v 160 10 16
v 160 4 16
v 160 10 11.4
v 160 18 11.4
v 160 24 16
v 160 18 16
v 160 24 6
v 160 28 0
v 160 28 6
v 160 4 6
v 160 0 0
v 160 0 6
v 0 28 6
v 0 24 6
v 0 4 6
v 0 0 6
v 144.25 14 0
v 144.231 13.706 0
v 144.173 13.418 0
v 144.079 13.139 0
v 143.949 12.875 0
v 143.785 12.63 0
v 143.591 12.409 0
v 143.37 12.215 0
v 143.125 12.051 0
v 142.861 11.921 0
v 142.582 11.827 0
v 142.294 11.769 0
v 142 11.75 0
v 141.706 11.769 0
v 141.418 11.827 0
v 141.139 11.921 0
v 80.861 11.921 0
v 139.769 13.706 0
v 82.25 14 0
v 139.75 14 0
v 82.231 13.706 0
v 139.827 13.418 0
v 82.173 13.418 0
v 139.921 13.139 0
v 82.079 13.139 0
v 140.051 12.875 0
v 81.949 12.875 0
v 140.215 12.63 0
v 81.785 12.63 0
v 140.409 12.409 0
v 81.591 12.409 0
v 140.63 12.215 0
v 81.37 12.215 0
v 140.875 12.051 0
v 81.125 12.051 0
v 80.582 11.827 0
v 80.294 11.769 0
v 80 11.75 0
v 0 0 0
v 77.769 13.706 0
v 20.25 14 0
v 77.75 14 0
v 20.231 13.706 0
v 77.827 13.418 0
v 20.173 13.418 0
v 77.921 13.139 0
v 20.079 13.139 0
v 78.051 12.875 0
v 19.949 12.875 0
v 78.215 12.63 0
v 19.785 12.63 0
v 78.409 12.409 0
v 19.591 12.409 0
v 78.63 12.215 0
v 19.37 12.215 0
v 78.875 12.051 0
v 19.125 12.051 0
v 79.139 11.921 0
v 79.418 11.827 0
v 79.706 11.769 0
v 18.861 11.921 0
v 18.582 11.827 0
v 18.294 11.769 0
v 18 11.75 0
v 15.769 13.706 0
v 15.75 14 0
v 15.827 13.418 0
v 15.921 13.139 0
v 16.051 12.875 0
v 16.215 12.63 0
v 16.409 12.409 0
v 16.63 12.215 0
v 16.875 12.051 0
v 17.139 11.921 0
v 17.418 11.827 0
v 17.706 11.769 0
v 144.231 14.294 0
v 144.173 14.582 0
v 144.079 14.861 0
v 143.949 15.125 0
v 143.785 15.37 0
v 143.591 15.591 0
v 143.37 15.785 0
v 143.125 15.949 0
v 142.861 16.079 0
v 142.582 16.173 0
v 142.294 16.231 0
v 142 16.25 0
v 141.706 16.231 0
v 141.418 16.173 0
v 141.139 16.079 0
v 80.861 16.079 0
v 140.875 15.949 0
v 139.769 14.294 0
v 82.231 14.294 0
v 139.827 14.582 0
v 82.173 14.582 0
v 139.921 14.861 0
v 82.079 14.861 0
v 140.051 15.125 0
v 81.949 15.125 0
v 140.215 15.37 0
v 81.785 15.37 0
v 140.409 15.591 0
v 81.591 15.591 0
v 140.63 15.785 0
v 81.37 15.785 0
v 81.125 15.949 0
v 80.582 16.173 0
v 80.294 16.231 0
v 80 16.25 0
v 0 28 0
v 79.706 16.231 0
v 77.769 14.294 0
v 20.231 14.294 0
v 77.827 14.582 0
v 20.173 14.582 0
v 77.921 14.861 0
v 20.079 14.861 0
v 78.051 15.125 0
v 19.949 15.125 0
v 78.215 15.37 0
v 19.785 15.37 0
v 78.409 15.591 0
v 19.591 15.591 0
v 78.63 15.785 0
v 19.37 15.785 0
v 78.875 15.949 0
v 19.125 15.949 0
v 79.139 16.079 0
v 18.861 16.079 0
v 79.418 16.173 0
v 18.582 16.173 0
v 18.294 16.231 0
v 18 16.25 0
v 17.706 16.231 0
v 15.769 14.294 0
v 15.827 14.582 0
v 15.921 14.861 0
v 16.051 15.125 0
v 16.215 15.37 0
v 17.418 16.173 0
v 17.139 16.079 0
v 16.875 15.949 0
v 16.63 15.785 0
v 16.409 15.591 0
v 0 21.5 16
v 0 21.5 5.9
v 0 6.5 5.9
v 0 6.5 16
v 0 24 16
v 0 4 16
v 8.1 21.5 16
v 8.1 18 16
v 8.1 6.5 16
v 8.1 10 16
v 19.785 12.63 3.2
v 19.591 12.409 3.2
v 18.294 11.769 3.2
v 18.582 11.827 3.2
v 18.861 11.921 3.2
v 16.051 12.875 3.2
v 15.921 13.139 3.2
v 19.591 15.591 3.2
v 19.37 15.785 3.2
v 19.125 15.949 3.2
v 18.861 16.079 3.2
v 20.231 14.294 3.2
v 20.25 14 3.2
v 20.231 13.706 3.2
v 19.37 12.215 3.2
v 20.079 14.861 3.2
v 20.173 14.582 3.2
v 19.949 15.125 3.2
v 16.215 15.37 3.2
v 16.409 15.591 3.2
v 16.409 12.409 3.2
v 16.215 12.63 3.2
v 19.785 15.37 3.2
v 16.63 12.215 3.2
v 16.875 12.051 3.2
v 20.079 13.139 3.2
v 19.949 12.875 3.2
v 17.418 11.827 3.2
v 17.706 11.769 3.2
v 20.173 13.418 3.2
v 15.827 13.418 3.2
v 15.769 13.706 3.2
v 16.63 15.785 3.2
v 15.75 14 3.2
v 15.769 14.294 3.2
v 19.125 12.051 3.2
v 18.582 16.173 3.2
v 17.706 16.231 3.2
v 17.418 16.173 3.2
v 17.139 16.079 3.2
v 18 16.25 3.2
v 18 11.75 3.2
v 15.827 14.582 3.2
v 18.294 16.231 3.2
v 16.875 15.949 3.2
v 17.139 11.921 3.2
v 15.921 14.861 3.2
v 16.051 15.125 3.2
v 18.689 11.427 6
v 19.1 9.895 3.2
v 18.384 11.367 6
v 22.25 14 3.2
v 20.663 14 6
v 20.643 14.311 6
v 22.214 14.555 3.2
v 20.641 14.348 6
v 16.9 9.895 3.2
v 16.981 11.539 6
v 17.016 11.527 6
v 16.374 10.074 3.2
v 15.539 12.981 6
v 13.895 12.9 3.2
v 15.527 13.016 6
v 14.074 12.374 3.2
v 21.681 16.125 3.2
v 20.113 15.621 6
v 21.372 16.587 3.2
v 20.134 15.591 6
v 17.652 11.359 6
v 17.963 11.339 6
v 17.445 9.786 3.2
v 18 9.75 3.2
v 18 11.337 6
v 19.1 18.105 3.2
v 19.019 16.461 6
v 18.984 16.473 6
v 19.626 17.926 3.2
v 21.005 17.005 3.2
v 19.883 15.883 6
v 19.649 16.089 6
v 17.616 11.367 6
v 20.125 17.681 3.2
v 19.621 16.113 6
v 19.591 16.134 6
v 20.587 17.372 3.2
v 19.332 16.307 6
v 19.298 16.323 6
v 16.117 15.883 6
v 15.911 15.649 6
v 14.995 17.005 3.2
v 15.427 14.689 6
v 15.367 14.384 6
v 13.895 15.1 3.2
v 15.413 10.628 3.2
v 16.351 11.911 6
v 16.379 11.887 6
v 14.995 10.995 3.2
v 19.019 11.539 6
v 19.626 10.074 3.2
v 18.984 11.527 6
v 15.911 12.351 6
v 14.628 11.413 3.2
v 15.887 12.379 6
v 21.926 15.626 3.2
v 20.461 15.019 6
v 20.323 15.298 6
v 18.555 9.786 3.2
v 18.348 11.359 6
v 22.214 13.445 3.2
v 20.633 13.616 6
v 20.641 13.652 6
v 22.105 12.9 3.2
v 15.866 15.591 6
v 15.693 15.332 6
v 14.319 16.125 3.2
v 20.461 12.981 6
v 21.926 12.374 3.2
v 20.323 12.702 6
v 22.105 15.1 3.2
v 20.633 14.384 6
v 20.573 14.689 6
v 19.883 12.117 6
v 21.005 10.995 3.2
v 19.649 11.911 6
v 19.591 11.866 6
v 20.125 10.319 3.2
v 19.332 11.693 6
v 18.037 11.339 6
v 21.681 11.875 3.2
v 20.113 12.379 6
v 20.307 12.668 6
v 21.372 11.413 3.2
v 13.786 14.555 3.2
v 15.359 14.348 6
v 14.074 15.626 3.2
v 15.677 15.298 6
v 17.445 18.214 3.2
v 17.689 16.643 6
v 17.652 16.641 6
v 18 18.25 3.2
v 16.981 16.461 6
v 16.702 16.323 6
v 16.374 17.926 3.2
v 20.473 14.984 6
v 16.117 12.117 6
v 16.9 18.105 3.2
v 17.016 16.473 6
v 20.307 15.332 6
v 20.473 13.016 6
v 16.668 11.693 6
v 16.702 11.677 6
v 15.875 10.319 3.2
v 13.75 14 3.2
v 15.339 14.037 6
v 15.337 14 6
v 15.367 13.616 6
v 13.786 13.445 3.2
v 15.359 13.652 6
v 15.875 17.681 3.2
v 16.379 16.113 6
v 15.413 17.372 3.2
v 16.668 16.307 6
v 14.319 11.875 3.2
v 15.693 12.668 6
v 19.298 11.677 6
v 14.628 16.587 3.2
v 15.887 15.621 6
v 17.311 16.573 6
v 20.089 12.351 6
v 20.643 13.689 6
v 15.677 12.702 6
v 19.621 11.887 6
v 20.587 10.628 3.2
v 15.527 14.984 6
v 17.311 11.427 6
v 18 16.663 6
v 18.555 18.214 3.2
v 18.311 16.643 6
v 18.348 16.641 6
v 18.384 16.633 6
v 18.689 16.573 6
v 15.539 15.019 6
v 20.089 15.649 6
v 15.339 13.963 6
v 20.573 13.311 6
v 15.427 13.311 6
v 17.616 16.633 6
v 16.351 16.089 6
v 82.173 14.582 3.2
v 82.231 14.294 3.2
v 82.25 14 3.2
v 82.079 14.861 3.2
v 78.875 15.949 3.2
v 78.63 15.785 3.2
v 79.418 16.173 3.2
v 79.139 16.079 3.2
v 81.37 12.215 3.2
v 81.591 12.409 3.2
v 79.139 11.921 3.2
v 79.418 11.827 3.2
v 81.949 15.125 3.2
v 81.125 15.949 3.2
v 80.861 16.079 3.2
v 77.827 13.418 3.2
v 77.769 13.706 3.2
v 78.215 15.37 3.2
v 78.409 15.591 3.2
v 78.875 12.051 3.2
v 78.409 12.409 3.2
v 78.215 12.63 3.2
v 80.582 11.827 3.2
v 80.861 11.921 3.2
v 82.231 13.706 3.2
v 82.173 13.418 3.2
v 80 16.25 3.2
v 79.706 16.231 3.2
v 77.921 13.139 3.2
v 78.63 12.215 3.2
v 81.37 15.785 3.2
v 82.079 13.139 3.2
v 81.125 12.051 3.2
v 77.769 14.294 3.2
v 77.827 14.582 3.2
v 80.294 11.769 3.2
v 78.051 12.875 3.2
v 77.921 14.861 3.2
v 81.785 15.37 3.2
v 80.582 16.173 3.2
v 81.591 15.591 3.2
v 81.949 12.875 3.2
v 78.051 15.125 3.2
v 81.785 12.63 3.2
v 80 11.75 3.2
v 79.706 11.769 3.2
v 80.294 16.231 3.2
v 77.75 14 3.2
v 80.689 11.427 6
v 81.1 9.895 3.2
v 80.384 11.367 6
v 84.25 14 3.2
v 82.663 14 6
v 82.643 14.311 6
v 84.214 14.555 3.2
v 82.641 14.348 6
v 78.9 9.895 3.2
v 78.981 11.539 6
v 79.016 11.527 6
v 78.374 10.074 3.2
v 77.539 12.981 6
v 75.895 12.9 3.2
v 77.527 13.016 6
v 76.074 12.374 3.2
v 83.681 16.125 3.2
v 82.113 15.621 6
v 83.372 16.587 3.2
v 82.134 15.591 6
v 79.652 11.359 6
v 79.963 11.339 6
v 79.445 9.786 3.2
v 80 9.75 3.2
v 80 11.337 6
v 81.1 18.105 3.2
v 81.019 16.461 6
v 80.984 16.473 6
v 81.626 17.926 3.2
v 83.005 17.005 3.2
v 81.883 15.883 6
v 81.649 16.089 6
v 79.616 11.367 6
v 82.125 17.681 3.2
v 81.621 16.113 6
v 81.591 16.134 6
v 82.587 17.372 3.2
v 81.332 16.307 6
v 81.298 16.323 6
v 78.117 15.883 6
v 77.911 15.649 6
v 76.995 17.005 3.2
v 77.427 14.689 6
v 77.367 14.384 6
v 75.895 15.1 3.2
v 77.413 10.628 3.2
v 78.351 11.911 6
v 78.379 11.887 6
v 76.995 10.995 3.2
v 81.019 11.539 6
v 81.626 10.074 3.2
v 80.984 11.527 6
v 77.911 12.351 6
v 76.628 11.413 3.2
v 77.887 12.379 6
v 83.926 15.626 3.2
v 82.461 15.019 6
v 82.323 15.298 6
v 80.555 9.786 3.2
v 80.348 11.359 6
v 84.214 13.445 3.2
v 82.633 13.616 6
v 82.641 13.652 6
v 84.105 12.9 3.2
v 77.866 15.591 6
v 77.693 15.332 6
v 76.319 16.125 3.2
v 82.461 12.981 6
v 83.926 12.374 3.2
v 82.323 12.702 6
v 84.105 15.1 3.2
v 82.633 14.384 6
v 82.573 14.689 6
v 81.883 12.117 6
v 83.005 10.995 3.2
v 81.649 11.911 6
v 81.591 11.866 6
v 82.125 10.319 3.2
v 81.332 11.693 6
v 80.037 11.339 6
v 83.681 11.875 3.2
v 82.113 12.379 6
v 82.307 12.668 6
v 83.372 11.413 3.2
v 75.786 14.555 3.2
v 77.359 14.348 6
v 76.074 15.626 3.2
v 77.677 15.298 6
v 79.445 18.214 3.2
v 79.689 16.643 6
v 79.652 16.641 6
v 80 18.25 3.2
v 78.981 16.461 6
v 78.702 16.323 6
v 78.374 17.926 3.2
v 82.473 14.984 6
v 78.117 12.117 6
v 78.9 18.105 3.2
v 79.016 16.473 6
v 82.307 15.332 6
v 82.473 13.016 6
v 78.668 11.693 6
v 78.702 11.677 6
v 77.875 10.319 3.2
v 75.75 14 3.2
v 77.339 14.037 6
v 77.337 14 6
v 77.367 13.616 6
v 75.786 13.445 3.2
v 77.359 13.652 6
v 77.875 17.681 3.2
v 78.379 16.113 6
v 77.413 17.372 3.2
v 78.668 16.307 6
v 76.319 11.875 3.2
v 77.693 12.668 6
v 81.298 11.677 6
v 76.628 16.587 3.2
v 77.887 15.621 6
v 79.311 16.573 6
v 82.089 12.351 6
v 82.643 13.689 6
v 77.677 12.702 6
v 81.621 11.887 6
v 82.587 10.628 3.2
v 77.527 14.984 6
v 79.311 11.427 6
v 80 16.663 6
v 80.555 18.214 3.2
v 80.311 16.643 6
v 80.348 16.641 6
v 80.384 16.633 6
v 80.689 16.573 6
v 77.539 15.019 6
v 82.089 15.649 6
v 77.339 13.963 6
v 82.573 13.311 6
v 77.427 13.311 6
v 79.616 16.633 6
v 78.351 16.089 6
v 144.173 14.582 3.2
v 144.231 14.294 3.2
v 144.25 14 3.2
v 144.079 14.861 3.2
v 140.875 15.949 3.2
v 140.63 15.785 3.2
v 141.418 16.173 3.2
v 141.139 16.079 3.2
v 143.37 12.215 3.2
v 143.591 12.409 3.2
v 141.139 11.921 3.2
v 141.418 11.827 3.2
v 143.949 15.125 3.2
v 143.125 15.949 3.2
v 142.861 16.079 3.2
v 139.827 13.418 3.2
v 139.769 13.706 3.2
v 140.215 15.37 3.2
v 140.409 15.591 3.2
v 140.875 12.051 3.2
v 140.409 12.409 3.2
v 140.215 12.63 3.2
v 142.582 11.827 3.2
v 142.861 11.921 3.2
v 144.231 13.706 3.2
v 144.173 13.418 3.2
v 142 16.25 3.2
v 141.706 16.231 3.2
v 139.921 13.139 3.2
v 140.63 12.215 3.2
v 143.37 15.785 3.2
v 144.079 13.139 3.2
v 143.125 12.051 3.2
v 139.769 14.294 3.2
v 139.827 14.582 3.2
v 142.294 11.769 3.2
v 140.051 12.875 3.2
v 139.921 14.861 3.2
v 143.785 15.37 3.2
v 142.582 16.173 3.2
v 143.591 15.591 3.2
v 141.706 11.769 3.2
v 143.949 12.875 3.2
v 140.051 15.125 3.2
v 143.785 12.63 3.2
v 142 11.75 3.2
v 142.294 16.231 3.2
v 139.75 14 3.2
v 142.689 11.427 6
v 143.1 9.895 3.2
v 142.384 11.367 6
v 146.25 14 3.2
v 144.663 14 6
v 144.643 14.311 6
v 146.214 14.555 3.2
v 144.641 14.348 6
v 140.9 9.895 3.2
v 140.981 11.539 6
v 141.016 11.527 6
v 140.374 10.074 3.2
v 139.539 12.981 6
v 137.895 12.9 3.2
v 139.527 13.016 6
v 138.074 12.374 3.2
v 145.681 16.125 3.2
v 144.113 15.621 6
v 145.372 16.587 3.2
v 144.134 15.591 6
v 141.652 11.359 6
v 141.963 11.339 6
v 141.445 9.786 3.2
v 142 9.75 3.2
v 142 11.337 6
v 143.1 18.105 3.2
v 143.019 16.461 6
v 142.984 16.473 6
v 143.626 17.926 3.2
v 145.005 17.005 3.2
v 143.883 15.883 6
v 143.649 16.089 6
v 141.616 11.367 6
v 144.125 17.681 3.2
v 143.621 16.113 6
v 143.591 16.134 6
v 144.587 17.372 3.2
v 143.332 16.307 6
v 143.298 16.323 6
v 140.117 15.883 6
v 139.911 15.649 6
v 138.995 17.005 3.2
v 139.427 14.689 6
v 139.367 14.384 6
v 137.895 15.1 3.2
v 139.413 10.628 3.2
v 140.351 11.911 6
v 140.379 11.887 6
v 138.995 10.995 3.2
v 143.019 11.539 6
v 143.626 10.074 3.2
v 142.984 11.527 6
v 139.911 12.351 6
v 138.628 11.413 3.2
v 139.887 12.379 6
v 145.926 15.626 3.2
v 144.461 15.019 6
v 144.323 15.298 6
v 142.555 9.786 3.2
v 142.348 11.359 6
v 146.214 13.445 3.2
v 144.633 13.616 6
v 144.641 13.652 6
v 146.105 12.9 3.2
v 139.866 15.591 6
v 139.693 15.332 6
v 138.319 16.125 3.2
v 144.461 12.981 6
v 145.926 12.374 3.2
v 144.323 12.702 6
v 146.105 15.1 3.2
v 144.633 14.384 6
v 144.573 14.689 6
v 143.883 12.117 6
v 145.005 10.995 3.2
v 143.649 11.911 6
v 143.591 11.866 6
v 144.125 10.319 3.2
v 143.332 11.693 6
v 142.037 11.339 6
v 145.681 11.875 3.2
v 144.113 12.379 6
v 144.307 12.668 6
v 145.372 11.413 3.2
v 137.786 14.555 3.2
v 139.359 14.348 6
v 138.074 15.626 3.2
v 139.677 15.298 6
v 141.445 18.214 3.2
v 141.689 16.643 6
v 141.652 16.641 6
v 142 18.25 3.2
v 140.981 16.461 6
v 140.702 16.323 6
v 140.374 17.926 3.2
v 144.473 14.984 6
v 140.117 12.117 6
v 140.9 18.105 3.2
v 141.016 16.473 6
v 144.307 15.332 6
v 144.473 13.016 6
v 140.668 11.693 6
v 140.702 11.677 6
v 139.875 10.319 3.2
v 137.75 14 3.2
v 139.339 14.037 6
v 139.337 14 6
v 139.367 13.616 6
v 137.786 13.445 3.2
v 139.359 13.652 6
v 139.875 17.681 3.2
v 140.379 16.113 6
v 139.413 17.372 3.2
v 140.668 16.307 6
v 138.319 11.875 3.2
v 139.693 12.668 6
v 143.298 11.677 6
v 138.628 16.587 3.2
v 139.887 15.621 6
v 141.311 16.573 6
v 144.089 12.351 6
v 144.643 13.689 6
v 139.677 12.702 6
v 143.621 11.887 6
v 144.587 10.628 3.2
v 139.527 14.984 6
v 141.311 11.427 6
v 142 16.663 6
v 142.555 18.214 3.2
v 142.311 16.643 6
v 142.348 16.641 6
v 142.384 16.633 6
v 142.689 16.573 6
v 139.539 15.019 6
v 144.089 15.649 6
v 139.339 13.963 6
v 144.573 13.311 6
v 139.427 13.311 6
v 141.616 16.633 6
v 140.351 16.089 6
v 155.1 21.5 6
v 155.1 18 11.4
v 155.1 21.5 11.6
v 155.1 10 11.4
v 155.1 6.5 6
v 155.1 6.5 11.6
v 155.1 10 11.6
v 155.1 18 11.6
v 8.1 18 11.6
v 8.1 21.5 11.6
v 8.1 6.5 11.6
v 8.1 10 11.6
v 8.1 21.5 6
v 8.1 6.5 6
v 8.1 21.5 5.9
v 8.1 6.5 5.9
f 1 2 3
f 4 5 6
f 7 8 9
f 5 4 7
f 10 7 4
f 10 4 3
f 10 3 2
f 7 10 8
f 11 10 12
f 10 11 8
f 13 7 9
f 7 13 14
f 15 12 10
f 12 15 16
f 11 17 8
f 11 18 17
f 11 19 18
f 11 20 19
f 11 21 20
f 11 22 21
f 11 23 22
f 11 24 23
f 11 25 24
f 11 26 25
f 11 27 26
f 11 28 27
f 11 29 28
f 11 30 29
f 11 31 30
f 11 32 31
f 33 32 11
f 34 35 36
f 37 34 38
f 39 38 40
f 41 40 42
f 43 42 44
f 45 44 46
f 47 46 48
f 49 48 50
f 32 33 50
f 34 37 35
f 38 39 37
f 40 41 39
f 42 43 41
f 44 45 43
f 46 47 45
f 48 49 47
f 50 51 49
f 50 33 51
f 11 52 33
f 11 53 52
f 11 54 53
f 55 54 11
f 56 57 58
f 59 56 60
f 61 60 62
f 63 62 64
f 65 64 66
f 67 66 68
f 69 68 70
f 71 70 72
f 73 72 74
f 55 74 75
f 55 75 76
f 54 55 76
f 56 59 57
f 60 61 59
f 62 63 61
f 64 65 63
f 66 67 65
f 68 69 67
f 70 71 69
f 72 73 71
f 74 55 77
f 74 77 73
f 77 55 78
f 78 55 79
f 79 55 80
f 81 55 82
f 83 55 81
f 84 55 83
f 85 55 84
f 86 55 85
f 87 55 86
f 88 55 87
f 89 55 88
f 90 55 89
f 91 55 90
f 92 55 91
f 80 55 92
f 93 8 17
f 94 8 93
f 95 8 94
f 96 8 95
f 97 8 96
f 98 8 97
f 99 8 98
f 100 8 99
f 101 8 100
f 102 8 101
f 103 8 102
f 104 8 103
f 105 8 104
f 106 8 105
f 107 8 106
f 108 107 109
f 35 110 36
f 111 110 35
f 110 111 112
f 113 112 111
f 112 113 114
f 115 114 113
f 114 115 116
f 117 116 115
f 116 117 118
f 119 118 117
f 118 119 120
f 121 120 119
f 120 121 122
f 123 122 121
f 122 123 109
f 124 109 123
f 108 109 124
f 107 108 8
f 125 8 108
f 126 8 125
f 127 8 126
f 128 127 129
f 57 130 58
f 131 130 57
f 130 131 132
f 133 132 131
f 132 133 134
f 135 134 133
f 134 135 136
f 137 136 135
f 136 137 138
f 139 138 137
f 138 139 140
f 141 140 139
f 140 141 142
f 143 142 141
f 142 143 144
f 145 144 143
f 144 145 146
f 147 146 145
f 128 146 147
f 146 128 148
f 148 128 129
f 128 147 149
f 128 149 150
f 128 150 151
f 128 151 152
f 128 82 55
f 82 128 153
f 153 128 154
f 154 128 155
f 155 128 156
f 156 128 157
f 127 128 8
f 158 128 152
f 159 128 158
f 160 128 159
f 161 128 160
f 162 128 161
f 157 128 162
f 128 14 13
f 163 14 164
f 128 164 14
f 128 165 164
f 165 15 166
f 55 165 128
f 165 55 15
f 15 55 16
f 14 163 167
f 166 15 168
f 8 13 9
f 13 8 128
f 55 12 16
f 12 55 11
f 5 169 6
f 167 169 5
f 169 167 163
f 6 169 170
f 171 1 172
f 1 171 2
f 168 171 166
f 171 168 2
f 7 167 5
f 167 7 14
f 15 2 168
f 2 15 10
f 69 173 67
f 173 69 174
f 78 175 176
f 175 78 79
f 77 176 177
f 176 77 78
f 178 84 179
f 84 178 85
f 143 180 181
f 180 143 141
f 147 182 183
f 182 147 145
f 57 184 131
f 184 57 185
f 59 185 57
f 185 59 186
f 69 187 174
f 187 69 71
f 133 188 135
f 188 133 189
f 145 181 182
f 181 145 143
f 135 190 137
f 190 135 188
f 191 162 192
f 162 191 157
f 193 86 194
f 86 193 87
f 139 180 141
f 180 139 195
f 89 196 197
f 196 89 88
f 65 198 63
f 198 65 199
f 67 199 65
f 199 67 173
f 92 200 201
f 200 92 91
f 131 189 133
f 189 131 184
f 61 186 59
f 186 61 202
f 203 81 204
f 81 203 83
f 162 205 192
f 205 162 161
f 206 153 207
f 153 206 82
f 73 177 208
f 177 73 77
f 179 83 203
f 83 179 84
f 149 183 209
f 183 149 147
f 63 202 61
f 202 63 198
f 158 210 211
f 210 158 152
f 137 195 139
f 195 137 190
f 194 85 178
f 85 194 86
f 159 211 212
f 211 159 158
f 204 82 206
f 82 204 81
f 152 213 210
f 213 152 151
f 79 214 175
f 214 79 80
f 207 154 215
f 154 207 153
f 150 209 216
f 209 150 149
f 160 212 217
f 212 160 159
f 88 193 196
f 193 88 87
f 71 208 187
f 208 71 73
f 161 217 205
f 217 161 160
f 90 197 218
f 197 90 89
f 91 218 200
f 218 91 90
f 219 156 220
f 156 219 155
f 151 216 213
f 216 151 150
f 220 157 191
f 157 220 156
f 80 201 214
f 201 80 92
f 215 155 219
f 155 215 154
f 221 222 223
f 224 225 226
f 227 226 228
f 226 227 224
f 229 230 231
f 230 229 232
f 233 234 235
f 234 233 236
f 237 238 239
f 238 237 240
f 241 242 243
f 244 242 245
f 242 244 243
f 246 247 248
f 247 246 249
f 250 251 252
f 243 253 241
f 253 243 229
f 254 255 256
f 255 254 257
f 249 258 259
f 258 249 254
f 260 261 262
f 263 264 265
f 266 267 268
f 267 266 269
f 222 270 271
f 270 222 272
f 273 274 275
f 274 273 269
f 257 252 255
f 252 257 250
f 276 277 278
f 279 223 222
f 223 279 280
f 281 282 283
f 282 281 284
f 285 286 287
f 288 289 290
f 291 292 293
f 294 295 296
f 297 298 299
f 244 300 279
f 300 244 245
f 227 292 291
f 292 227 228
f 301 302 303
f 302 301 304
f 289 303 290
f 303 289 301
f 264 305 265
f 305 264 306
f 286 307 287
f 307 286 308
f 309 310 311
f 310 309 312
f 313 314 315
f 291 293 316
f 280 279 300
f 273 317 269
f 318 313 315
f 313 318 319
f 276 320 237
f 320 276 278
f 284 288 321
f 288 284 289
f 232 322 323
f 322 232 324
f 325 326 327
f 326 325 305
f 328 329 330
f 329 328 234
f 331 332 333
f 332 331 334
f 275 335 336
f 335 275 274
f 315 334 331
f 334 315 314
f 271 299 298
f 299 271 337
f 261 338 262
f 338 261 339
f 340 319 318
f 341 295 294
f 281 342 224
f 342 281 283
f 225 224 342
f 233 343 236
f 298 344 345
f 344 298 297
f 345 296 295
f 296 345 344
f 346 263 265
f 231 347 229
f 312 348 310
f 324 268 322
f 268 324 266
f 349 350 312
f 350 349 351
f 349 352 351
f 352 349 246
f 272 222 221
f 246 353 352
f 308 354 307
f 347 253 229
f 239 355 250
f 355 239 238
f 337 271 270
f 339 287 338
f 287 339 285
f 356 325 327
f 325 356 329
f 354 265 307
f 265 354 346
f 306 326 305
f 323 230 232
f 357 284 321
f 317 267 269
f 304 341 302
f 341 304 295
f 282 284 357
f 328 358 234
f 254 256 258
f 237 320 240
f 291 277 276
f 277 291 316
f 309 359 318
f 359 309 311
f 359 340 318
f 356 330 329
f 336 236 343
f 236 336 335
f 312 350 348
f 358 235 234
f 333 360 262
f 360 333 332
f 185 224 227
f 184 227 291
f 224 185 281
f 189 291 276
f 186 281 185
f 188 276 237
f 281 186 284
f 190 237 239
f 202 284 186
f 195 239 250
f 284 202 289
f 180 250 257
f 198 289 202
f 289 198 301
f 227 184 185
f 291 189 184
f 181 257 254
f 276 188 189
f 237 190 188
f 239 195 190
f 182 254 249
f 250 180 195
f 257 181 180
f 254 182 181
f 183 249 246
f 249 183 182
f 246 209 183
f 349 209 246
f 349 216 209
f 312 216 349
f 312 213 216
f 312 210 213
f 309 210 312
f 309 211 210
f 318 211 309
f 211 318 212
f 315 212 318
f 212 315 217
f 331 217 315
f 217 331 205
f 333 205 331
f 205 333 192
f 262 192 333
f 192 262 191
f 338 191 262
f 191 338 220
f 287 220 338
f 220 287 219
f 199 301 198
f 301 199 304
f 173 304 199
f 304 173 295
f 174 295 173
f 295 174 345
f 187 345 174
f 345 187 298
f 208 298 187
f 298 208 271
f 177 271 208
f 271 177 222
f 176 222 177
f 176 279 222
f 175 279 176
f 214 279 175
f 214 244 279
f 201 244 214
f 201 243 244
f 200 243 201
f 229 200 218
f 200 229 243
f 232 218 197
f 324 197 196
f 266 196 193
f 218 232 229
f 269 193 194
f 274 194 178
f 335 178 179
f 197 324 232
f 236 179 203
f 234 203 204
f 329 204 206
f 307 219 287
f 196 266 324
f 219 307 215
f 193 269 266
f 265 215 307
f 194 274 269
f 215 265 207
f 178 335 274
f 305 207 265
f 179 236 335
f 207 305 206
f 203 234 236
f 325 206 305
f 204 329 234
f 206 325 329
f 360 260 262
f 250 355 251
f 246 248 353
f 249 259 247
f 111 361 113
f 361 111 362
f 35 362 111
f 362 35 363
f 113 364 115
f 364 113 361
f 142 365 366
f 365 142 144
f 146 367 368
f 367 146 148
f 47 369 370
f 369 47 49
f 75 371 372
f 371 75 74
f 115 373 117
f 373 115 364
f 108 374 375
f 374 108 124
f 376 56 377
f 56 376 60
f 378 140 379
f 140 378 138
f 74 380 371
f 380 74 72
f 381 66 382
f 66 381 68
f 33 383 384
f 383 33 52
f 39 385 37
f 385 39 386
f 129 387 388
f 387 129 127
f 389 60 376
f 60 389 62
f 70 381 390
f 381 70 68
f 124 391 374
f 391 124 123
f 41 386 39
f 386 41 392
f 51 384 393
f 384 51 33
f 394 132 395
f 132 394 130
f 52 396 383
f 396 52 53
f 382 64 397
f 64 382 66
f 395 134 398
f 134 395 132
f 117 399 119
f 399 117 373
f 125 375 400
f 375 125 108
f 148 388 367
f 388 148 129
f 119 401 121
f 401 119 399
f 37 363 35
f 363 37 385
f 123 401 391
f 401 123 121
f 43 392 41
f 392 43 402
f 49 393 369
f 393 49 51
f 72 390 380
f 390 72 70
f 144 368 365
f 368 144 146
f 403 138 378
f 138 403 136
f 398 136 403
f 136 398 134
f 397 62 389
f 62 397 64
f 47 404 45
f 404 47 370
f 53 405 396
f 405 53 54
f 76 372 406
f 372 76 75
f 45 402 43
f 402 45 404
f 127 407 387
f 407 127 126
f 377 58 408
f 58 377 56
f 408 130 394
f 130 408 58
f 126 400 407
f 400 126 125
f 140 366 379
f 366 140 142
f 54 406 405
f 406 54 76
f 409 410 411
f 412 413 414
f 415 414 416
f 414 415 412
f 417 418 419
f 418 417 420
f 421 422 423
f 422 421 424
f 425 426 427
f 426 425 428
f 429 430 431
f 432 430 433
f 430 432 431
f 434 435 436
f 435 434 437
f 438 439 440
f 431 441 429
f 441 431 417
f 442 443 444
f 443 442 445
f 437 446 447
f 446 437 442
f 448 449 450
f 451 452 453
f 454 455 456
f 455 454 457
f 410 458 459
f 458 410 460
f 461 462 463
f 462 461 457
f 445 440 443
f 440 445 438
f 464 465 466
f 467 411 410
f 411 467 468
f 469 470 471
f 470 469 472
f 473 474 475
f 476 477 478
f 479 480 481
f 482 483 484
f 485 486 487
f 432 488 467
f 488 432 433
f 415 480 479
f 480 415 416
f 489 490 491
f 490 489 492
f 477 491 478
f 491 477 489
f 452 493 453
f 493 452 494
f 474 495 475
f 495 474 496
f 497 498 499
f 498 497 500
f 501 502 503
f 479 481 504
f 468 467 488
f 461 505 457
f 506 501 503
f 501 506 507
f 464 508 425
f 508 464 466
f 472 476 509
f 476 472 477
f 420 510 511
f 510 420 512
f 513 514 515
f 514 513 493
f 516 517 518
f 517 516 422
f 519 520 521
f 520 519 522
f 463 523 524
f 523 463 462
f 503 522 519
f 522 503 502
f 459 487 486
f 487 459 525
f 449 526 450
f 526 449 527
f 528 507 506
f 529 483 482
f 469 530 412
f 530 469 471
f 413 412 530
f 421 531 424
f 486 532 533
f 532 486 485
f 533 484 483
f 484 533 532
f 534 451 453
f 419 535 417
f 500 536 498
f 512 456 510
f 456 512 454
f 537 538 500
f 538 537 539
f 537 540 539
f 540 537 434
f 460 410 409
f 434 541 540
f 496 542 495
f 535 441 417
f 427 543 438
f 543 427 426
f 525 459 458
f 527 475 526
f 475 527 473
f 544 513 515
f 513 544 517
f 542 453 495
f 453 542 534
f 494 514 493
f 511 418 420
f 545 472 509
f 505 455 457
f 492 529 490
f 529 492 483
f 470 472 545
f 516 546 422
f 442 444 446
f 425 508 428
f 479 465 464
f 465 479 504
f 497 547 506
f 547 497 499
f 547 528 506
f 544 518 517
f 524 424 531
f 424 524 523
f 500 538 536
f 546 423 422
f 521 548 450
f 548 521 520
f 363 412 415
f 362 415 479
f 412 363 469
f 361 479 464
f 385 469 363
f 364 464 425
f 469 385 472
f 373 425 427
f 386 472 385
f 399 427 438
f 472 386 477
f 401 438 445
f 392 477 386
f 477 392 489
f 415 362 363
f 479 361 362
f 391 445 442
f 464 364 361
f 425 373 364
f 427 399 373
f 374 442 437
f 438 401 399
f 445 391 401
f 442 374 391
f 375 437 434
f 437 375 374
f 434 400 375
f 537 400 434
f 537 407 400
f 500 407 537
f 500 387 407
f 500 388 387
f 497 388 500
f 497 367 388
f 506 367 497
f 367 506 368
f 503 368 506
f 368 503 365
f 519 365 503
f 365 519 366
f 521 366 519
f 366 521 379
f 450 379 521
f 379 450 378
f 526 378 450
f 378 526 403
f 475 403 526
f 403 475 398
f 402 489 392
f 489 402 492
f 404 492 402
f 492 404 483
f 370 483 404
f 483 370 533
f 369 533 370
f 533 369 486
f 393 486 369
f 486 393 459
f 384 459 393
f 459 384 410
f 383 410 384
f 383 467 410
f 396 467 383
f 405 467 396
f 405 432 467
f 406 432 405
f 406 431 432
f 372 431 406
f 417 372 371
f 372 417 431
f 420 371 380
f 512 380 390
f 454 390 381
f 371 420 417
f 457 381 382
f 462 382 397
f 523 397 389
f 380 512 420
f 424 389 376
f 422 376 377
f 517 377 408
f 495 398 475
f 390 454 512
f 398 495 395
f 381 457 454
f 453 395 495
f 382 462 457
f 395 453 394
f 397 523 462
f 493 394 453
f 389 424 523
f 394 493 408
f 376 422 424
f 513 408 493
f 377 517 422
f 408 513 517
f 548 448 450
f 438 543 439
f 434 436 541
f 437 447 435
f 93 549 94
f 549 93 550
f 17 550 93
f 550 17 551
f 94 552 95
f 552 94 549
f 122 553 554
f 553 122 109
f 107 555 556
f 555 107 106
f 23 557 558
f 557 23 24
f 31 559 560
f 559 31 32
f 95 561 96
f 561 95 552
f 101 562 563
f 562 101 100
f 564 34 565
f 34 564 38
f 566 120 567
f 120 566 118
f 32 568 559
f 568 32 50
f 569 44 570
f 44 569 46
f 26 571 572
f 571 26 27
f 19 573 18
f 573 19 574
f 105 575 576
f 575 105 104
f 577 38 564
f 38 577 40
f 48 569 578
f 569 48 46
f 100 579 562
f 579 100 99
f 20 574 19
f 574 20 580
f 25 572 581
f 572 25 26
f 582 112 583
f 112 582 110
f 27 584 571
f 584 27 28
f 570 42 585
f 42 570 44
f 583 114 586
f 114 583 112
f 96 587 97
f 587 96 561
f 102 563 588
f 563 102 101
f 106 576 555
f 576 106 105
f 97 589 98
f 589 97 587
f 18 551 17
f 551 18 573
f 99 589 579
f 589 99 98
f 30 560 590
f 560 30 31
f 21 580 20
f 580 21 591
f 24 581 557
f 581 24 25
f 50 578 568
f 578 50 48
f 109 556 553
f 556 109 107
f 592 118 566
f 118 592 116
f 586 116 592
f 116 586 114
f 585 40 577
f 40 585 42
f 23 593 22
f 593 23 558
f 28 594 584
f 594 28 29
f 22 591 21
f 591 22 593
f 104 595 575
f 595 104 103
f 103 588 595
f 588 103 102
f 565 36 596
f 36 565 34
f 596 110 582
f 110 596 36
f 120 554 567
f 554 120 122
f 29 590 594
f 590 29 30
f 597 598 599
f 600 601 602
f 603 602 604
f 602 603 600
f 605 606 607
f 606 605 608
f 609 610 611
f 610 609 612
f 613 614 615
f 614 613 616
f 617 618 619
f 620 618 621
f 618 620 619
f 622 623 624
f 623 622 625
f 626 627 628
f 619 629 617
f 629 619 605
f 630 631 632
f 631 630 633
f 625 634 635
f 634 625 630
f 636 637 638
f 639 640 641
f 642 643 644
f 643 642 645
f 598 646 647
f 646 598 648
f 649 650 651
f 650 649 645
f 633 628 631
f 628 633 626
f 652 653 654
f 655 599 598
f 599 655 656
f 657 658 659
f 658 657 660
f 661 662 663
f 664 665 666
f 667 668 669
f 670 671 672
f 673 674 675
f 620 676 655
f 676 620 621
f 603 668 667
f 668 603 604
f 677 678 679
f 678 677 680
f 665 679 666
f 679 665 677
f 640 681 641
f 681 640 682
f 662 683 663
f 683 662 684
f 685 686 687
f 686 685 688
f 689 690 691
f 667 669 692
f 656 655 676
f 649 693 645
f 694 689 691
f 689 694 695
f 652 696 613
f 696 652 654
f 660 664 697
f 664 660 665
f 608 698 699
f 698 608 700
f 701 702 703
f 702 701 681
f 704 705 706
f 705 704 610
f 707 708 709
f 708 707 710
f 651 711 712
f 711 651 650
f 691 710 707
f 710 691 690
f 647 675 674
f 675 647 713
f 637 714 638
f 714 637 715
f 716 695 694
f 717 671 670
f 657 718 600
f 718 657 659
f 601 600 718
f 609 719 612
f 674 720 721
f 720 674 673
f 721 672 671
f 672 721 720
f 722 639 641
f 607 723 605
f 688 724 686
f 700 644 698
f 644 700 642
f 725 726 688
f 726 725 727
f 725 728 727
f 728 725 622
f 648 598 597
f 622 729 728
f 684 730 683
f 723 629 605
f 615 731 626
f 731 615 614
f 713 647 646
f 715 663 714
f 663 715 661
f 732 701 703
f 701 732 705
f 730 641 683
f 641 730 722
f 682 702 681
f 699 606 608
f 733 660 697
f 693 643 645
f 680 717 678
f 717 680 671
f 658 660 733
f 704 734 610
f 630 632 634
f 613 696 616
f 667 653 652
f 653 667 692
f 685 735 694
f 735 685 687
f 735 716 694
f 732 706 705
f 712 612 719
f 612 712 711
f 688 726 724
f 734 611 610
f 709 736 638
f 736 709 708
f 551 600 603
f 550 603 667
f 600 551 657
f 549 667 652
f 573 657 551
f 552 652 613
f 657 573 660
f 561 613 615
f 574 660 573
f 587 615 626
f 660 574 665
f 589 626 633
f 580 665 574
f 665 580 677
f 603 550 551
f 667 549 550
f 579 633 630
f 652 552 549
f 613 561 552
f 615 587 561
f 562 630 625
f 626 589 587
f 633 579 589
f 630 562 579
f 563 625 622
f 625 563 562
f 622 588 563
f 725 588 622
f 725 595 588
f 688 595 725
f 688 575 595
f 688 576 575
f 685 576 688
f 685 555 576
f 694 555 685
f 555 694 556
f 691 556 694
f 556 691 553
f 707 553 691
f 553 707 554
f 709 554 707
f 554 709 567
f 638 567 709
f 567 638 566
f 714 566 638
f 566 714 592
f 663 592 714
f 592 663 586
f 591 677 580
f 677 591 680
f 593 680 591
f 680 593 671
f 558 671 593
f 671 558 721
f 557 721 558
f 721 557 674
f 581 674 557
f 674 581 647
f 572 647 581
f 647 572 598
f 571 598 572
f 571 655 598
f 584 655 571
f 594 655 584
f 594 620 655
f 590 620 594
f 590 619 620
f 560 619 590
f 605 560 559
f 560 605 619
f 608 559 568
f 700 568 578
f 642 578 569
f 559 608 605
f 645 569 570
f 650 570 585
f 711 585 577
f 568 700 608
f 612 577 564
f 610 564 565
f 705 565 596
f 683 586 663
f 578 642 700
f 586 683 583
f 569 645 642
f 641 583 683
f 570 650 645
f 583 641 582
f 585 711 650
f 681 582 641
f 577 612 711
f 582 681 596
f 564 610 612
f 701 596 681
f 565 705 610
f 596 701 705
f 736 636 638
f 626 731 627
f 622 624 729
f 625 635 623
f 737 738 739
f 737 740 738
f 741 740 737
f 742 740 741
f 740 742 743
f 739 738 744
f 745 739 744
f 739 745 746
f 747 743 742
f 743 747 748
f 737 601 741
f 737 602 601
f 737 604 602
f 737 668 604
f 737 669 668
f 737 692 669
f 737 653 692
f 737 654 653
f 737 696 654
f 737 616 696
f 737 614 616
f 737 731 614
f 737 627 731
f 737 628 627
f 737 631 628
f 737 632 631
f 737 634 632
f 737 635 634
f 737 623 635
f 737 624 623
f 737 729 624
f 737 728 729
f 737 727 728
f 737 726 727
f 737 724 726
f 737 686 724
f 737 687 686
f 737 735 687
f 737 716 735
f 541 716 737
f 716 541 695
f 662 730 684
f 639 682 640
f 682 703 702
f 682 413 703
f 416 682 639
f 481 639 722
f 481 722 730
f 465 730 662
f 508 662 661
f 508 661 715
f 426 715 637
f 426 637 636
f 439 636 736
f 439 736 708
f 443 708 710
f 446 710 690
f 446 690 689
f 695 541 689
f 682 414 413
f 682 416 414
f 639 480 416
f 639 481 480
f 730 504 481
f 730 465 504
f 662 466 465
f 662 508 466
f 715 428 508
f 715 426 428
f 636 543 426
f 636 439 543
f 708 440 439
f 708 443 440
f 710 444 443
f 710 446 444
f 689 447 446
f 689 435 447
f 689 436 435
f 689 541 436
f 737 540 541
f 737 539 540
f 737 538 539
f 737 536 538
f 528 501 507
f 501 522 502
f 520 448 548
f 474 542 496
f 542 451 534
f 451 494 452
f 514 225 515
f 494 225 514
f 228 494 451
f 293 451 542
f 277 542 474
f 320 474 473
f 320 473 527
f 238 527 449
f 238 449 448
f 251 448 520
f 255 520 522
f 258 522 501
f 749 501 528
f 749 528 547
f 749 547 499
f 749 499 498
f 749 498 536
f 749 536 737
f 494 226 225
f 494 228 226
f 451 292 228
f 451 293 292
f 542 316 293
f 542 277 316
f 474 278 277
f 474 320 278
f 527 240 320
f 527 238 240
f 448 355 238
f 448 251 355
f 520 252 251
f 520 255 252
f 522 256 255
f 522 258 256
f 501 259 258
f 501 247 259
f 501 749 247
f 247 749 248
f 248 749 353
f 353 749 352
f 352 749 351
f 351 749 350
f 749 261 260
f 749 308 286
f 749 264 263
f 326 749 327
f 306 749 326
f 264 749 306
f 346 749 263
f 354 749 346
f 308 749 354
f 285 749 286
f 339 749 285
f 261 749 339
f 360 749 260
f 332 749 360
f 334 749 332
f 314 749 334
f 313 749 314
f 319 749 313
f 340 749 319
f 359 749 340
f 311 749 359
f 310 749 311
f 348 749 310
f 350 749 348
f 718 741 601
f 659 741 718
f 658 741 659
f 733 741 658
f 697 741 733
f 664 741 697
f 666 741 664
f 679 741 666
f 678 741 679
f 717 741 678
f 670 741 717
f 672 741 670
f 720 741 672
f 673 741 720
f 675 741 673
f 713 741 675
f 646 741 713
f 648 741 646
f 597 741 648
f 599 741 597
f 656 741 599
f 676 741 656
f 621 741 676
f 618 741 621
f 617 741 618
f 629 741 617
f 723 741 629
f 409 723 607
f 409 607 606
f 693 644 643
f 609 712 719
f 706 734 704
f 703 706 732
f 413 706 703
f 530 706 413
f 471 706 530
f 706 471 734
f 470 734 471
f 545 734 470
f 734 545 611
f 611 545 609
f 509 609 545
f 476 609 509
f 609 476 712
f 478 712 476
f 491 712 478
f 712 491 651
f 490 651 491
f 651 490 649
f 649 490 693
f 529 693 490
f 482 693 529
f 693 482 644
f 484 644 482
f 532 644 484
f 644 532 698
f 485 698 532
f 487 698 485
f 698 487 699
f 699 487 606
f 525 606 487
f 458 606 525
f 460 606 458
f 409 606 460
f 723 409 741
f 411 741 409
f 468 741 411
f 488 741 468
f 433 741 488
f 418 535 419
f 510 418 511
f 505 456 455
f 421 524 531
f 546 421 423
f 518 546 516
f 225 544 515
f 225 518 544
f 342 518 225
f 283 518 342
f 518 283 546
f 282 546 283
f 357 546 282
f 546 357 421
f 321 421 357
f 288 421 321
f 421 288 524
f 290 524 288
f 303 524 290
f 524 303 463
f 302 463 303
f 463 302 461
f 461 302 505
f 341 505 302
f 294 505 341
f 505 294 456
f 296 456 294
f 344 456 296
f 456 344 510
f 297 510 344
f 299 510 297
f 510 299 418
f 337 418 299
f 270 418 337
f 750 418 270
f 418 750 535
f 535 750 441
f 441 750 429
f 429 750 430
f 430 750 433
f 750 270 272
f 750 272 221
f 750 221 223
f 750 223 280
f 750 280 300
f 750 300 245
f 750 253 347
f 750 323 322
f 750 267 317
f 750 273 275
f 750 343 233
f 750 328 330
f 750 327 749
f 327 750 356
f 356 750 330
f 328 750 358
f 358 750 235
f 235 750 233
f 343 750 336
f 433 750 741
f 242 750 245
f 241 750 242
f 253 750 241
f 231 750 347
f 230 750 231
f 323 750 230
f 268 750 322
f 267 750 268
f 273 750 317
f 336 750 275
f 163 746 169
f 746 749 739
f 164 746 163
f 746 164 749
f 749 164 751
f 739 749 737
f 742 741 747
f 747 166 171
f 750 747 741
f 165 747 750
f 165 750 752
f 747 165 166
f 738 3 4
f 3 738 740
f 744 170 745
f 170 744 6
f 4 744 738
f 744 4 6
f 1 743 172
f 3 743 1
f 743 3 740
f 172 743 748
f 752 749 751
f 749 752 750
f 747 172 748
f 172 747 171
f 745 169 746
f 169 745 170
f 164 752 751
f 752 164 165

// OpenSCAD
shelf_length = 1200;
shelf_depth = 200;
shelf_thickness = 18;

box_width = 220;
box_depth = 150;
box_height = 70;

slide_length = 160;
union_overlap = 0.4;

table_rail_width = 28;
table_mount_thickness = 6;
table_slot_outer_width = 20;
table_slot_depth = 10;
table_slot_head_width = 15;
table_slot_opening_width = 8;
rear_stop_thickness = 5;
front_entry_length = 8;

runner_mount_thickness = 6;
runner_mount_height = 36;
runner_head_width = 14.4;
runner_head_height = 5.5;
runner_neck_width = 7.4;
runner_neck_height = 4.5;
runner_clearance = 0.55;
front_detent_length = 10;
front_detent_height = 1.8;
front_detent_offset = 12;

add_mount_holes = true;
table_mount_hole_diameter = 4.5;
table_mount_head_diameter = 8.5;
table_mount_head_depth = 2.8;
box_mount_hole_diameter = 4.0;

render_part = "table";  // "table", "box", "assembly"
show_preview = false;
show_box = true;

$fn = 48;

table_slot_y = (table_rail_width - table_slot_outer_width) / 2;
table_slot_head_y = (table_rail_width - table_slot_head_width) / 2;
table_slot_open_y = (table_rail_width - table_slot_opening_width) / 2;
runner_head_y = (runner_mount_thickness - runner_head_width) / 2;
runner_neck_y = (runner_mount_thickness - runner_neck_width) / 2;

table_mount_hole_positions = [18, slide_length / 2, slide_length - 18];
box_mount_hole_positions = [18, slide_length / 2, slide_length - 18];

box_y = (shelf_length - box_width) / 2;
box_x = shelf_depth - box_depth;
left_runner_y = box_y - runner_mount_thickness;
right_runner_y = box_y + box_width;
left_table_y = left_runner_y - ((table_rail_width - runner_mount_thickness) / 2);
right_table_y = right_runner_y - ((table_rail_width - runner_mount_thickness) / 2);

echo("Table rail print size (mm):", [slide_length, table_rail_width, table_mount_thickness + table_slot_depth]);
echo("Box runner print size (mm):", [slide_length, runner_mount_height, runner_head_width]);
echo("Runner clearance (mm):", runner_clearance);
echo("Mount hole positions (mm):", table_mount_hole_positions);

module table_mount_holes() {
    for (x_pos = table_mount_hole_positions) {
        translate([x_pos, table_rail_width / 2, -0.1])
            cylinder(h = table_mount_thickness + 0.2, d = table_mount_hole_diameter);

        translate([x_pos, table_rail_width / 2, table_mount_thickness - table_mount_head_depth])
            cylinder(h = table_mount_head_depth + 0.2, d1 = table_mount_head_diameter, d2 = table_mount_hole_diameter + 0.6);
    }
}

module table_rail_installed() {
    difference() {
        union() {
            cube([slide_length, table_rail_width, table_mount_thickness]);

            translate([0, table_slot_y, table_mount_thickness - union_overlap])
                cube([slide_length, table_slot_outer_width, table_slot_depth + union_overlap]);

            translate([slide_length - rear_stop_thickness, table_slot_y, table_mount_thickness + table_slot_depth - 2 - union_overlap])
                cube([rear_stop_thickness, table_slot_outer_width, 2 + union_overlap]);

            translate([
                front_detent_offset,
                table_slot_head_y,
                table_mount_thickness + table_slot_depth - runner_neck_height - front_detent_height
            ])
                cube([front_detent_length, table_slot_head_width, front_detent_height]);
        }

        translate([-0.1, table_slot_head_y, table_mount_thickness])
            cube([
                slide_length - rear_stop_thickness + 0.2,
                table_slot_head_width,
                table_slot_depth - runner_neck_height + 0.1
            ]);

        translate([-0.1, table_slot_open_y, table_mount_thickness + table_slot_depth - runner_neck_height - 0.1])
            cube([slide_length + 0.2, table_slot_opening_width, runner_neck_height + 0.2]);

        translate([-0.1, table_slot_head_y, table_mount_thickness - 0.1])
            cube([
                front_entry_length + 0.2,
                table_slot_head_width,
                table_slot_depth + 0.2
            ]);

        if (add_mount_holes) {
            table_mount_holes();
        }
    }
}

module box_mount_holes() {
    for (x_pos = box_mount_hole_positions) {
        translate([x_pos, -0.1, runner_mount_height / 2])
            rotate([-90, 0, 0])
                cylinder(h = runner_mount_thickness + 0.2, d = box_mount_hole_diameter);
    }
}

module box_runner_installed() {
    difference() {
        union() {
            translate([0, 0, table_mount_thickness + table_slot_depth - union_overlap])
                cube([slide_length, runner_mount_thickness, runner_mount_height + union_overlap]);

            translate([0, runner_head_y, table_mount_thickness + table_slot_depth - runner_neck_height - runner_head_height + runner_clearance])
                cube([slide_length, runner_head_width, runner_head_height]);

            translate([0, runner_neck_y, table_mount_thickness + table_slot_depth - runner_neck_height - union_overlap + runner_clearance])
                cube([slide_length, runner_neck_width, runner_neck_height + union_overlap]);
        }

        if (add_mount_holes) {
            box_mount_holes();
        }
    }
}

module table_rail_print() {
    table_rail_installed();
}

module box_runner_print() {
    rotate([0, -90, 0])
        translate([0, 0, -slide_length])
            box_runner_installed();
}

module box_preview() {
    color([0.72, 0.58, 0.42])
        translate([box_x, box_y, table_mount_thickness + table_slot_depth + runner_mount_height])
            cube([box_depth, box_width, box_height]);
}

module assembly_preview() {
    color([0.84, 0.84, 0.88])
        cube([shelf_depth, shelf_length, shelf_thickness]);

    color([0.2, 0.25, 0.3]) {
        translate([0, left_table_y, shelf_thickness])
            table_rail_installed();

        translate([0, right_table_y, shelf_thickness])
            table_rail_installed();
    }

    color([0.28, 0.33, 0.38]) {
        translate([0, left_runner_y, shelf_thickness])
            box_runner_installed();

        translate([0, right_runner_y, shelf_thickness])
            box_runner_installed();
    }

    if (show_box) {
        box_preview();
    }
}

if (show_preview || render_part == "assembly") {
    assembly_preview();
} else if (render_part == "box") {
    box_runner_print();
} else {
    table_rail_print();
}
